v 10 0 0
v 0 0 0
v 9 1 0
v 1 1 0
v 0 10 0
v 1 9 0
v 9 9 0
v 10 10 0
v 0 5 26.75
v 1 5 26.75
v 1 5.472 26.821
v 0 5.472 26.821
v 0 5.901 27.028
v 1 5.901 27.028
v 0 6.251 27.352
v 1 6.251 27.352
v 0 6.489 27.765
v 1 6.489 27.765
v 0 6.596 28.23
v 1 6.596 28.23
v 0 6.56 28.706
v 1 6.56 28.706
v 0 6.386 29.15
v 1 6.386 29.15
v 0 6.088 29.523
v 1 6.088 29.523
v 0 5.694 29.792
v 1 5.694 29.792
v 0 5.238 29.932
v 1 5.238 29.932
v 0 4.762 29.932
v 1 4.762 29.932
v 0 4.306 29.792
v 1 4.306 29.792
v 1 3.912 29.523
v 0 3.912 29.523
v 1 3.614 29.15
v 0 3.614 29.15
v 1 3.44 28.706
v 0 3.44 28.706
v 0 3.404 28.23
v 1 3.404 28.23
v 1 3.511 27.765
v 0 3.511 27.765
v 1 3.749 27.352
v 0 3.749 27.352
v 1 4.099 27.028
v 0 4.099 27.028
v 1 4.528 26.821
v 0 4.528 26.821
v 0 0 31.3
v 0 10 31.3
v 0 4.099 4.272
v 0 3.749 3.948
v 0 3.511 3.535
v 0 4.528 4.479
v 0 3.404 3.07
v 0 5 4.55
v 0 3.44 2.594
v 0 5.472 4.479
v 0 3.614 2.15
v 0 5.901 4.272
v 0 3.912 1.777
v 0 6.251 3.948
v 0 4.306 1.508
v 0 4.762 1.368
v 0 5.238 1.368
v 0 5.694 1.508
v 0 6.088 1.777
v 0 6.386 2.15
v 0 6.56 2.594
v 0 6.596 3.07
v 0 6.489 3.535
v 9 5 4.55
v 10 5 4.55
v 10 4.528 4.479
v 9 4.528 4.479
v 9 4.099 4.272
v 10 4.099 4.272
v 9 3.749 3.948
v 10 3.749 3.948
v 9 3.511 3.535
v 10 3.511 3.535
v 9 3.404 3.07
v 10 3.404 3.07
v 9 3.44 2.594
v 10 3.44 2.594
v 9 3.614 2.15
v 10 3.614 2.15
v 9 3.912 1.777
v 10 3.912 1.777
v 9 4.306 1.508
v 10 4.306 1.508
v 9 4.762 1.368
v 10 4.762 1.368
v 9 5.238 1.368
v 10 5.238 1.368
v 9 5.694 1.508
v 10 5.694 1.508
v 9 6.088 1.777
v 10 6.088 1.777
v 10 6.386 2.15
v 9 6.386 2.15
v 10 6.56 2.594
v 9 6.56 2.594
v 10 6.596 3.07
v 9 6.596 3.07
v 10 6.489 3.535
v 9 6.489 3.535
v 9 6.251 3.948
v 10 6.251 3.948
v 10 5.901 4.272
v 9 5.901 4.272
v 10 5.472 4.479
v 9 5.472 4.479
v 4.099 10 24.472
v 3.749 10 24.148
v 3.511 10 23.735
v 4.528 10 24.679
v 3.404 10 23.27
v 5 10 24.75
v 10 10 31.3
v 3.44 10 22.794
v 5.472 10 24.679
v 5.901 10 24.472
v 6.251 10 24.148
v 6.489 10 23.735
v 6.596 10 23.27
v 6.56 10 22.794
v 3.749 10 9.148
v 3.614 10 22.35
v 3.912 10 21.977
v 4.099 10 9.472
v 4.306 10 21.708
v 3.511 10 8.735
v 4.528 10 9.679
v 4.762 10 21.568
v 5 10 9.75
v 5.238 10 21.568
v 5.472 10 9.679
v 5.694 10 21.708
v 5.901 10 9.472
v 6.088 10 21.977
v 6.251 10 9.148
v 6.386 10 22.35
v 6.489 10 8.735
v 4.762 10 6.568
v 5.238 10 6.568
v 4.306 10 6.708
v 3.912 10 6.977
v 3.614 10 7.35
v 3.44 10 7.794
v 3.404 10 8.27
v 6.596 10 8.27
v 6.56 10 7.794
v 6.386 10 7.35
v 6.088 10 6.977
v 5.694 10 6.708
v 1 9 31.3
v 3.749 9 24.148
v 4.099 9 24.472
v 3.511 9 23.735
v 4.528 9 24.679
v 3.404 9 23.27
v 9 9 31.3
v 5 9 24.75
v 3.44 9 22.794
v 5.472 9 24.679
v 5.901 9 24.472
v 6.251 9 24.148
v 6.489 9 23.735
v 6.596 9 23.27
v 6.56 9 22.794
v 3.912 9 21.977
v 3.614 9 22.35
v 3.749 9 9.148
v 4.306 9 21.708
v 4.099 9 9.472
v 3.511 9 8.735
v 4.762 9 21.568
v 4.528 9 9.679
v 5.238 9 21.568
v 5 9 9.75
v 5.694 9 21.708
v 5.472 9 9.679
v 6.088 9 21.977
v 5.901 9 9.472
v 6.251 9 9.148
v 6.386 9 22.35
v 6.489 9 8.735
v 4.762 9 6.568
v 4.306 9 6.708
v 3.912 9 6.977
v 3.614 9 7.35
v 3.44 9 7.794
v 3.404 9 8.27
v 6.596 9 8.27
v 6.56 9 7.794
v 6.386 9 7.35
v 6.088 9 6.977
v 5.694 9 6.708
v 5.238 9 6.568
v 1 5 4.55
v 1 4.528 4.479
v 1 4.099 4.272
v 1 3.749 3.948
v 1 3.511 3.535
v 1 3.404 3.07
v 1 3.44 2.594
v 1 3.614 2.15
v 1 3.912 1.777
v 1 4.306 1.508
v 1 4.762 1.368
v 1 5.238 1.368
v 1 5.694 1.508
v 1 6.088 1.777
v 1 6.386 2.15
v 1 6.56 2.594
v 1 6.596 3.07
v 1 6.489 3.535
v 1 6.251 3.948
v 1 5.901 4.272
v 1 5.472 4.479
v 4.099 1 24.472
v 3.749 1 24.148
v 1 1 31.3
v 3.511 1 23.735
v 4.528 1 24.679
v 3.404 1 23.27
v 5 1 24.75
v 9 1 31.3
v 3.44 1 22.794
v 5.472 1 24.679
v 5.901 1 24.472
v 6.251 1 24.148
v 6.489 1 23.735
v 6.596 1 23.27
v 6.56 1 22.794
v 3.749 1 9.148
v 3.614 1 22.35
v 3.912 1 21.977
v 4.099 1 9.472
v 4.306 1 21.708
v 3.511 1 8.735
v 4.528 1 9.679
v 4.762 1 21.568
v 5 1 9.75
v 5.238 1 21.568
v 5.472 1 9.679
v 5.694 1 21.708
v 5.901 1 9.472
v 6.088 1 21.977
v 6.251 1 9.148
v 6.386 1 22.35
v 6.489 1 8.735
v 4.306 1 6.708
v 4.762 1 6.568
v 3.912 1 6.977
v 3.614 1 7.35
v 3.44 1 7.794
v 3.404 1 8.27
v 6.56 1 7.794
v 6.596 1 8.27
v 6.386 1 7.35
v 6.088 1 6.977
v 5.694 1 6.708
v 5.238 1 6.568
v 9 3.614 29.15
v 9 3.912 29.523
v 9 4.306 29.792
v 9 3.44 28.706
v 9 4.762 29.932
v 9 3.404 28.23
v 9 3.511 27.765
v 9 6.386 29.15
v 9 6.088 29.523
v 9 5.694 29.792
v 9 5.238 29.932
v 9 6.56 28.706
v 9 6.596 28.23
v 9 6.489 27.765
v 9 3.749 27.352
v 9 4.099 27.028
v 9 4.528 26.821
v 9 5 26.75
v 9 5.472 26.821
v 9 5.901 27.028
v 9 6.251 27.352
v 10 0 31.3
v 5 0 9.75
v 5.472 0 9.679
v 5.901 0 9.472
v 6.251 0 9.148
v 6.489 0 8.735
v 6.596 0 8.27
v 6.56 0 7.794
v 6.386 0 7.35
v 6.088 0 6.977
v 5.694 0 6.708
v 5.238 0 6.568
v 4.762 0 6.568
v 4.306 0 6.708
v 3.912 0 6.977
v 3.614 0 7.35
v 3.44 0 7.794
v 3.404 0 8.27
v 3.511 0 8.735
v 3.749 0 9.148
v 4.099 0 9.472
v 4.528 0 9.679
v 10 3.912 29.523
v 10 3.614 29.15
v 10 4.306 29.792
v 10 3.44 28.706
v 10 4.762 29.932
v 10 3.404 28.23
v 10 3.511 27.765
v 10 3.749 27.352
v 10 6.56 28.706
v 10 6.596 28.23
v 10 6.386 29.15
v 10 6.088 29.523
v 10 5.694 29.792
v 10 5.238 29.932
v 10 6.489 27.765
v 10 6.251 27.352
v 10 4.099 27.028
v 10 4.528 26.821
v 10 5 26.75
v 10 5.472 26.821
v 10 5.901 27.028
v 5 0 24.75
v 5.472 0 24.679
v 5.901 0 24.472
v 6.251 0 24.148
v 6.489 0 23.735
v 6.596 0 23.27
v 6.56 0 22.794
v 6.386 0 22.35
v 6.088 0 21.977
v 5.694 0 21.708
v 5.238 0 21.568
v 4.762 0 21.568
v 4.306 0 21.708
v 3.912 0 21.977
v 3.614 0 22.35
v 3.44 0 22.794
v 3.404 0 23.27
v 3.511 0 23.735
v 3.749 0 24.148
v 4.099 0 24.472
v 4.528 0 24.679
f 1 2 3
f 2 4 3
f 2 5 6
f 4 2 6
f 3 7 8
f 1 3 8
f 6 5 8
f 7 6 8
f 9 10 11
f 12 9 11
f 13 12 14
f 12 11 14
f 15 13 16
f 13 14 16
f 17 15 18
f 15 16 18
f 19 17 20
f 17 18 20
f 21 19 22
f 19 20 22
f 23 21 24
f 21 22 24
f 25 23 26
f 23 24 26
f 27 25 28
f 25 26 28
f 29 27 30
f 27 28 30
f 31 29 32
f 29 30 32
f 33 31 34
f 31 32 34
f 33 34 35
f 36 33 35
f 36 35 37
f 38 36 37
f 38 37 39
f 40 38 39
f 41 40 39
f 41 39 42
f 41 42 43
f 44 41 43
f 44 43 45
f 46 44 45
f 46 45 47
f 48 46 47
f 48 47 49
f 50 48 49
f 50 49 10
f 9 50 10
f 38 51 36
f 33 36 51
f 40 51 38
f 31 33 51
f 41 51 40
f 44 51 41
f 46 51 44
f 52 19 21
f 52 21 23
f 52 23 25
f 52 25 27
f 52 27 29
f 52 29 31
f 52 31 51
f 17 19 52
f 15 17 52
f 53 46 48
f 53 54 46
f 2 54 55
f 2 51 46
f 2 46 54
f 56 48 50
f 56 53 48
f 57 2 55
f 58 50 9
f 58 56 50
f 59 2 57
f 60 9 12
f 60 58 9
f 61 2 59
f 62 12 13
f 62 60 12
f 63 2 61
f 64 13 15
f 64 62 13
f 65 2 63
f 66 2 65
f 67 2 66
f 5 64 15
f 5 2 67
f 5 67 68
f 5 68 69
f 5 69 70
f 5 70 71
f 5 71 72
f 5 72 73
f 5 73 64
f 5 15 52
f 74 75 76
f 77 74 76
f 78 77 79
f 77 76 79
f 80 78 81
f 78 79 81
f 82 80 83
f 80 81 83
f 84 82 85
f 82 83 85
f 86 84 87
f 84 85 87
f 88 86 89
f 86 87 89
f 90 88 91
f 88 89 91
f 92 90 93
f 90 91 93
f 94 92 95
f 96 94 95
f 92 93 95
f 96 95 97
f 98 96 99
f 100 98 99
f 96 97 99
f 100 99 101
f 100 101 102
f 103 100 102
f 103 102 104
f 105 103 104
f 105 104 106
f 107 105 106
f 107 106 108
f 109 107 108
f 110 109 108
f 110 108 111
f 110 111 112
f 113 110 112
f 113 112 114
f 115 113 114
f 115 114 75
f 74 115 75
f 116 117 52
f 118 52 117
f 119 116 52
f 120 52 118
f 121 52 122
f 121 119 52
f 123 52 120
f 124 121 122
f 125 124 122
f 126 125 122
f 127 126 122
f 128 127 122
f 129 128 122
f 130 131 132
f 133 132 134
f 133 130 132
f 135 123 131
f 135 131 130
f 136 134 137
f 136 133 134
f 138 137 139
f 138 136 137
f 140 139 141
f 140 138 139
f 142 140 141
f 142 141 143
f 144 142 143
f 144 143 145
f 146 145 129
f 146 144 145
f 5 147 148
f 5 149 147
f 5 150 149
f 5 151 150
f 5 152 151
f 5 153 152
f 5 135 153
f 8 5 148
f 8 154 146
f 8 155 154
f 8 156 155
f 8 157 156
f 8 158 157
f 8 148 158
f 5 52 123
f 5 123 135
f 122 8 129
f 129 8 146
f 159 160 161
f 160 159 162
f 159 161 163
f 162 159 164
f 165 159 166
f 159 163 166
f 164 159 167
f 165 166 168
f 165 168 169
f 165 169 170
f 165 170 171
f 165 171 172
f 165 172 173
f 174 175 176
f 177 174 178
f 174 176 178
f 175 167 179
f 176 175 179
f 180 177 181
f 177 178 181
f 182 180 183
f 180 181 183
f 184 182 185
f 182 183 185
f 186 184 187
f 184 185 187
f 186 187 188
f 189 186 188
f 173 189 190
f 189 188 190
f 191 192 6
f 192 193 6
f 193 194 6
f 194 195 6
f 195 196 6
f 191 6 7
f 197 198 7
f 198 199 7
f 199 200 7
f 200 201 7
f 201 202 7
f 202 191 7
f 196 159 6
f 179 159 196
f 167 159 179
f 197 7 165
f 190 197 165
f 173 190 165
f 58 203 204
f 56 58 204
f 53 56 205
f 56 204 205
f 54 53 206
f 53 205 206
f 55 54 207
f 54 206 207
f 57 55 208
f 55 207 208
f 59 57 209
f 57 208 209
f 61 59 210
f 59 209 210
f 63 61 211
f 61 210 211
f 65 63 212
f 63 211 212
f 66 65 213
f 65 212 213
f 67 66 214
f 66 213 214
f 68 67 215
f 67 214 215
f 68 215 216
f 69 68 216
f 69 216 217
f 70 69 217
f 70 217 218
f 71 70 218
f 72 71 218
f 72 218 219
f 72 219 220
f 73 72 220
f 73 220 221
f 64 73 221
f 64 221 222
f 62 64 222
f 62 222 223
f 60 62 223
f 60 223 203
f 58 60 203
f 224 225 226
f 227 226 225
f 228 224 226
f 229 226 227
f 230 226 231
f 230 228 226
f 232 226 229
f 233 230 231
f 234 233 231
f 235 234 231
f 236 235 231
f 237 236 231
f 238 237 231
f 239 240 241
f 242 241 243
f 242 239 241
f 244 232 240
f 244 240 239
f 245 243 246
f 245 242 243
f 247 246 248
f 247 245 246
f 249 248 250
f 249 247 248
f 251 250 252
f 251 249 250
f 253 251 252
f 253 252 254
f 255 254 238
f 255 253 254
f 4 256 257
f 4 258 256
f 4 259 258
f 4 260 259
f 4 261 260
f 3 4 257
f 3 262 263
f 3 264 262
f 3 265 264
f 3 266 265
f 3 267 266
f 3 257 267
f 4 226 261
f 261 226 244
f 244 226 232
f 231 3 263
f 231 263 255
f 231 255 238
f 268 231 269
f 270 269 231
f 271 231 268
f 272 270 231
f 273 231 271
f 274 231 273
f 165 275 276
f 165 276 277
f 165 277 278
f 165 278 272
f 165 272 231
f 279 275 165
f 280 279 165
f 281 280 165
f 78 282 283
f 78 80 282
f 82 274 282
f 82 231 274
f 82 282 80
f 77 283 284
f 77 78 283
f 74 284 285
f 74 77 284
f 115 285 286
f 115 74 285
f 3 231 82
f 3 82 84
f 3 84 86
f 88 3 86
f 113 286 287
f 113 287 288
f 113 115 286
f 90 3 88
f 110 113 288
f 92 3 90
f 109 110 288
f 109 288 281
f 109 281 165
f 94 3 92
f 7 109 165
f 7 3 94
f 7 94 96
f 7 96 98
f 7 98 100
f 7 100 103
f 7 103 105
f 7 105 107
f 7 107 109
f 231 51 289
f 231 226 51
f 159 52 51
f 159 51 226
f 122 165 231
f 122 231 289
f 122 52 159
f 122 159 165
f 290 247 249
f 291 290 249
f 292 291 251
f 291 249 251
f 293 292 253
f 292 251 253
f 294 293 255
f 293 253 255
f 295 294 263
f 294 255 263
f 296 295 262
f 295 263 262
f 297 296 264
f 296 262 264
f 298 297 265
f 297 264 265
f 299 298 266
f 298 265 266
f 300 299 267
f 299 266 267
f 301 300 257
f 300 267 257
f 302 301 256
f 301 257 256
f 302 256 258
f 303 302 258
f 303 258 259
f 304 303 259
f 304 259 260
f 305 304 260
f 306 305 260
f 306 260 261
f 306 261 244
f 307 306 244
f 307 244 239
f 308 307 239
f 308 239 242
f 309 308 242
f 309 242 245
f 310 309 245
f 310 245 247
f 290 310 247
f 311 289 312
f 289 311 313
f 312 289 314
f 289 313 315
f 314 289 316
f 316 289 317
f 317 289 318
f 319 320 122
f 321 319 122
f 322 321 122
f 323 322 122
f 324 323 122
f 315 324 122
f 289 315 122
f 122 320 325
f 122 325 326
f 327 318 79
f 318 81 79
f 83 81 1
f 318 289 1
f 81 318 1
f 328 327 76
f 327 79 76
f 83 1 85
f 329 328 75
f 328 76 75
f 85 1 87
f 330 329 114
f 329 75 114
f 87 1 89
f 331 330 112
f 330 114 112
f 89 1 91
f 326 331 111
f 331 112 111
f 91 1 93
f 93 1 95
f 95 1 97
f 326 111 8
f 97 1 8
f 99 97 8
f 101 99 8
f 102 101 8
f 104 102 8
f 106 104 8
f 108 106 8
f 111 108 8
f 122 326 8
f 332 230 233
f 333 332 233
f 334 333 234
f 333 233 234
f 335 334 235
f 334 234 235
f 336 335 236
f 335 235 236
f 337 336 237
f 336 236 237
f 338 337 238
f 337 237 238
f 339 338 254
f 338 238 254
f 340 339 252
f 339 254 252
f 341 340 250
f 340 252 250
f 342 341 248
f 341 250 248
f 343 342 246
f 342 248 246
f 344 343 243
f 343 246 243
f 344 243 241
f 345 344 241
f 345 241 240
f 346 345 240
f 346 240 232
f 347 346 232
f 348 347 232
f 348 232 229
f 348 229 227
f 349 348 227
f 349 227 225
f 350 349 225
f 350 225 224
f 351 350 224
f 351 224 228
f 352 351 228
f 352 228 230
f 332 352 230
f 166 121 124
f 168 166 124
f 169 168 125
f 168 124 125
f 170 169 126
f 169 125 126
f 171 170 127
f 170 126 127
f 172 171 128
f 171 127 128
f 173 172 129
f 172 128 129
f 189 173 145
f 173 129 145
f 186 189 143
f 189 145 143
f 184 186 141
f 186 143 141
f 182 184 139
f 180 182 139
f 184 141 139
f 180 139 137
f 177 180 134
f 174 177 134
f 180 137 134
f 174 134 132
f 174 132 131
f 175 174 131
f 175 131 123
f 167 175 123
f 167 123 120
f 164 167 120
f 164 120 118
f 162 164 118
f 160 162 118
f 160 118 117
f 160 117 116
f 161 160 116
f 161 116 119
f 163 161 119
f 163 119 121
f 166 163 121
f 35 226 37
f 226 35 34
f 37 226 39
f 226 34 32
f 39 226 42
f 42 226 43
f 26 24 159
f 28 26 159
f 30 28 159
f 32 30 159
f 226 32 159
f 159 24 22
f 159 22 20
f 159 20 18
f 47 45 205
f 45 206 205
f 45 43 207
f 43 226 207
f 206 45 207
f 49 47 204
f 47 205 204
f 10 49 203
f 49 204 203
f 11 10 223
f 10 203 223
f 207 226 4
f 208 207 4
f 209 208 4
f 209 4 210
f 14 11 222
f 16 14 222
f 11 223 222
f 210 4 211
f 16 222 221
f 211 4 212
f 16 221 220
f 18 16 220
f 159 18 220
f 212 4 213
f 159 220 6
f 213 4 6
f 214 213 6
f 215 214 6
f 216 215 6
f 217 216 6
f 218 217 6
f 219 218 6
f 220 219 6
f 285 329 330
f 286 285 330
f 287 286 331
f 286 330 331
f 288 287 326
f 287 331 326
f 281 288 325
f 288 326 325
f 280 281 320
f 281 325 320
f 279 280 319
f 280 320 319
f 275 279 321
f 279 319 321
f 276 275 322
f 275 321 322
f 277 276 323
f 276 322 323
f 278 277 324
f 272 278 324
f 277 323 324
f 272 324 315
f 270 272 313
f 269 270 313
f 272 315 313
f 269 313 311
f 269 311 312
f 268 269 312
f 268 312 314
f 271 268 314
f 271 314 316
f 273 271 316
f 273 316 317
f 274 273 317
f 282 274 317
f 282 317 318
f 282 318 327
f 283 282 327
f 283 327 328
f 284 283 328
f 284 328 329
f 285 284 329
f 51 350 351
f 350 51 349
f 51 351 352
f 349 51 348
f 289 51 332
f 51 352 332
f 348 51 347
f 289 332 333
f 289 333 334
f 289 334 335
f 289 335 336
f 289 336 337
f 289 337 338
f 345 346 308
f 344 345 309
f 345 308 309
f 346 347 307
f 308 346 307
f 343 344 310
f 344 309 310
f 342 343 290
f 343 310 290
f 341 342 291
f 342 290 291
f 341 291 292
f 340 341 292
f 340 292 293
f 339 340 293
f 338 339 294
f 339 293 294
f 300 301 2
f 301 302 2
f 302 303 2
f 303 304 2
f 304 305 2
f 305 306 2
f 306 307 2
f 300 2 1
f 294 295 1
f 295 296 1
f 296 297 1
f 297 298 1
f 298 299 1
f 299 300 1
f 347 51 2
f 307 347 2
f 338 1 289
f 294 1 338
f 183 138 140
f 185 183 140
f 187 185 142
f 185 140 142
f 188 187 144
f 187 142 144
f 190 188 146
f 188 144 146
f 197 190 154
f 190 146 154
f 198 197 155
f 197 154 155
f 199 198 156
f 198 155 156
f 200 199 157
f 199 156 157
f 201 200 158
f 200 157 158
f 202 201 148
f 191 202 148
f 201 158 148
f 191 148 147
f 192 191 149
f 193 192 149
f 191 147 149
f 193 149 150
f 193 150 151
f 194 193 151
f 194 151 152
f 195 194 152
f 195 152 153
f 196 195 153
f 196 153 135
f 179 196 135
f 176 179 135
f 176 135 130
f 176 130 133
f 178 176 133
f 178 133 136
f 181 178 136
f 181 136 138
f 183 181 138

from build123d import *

# Parameters (mm, degrees)
SKETCH_2_W          = 10
SKETCH_2_H          = 10
SKETCH_2_W_2        = 8
SKETCH_2_H_2        = 8
EXTRUDE_1_DEPTH     = 31.3
CUT_EXTRUDE_1_REACH = 36.347
SKETCH_3_R          = 1.6
CUT_EXTRUDE_2_REACH = 36.347
SKETCH_4_R          = 1.6


with BuildPart() as part:
    # ｽｹｯﾁ2 → 押し出し-薄板1 (new body)
    with BuildSketch(Plane.XY):
        with Locations((5, 5)):
            Rectangle(SKETCH_2_W, SKETCH_2_H)
        with Locations((5, 5)):
            Rectangle(SKETCH_2_W_2, SKETCH_2_H_2, mode=Mode.SUBTRACT)
    extrude(amount=EXTRUDE_1_DEPTH)

    # ｶｯﾄ - 押し出し1: up to this face of the body (flat: up to its plane)
    cut_extrude_1_end = Plane(part.part.faces().sort_by_distance((5, 0, 15.65))[0])
    # ｽｹｯﾁ3 → ｶｯﾄ - 押し出し1 (cut, up to the picked face)
    with BuildSketch(Plane(origin=(0, 10, 0), x_dir=(1, 0, 0), z_dir=(0, 1, 0)), mode=Mode.PRIVATE) as cut_extrude_1_sk1:
        with Locations(Location((5, -23.15, 0), (0, 0, 270))):
            Circle(SKETCH_3_R)
    cut_extrude_1_tool1 = split(extrude(cut_extrude_1_sk1.sketch, amount=-CUT_EXTRUDE_1_REACH, mode=Mode.PRIVATE), bisect_by=cut_extrude_1_end, keep=Keep.BOTH, mode=Mode.PRIVATE)
    # ｽｹｯﾁ3 → ｶｯﾄ - 押し出し1 (cut, up to the picked face)
    with BuildSketch(Plane(origin=(0, 10, 0), x_dir=(1, 0, 0), z_dir=(0, 1, 0)), mode=Mode.PRIVATE) as cut_extrude_1_sk2:
        with Locations(Location((5, -8.15, 0), (0, 0, 270))):
            Circle(SKETCH_3_R)
    cut_extrude_1_tool2 = split(extrude(cut_extrude_1_sk2.sketch, amount=-CUT_EXTRUDE_1_REACH, mode=Mode.PRIVATE), bisect_by=cut_extrude_1_end, keep=Keep.BOTH, mode=Mode.PRIVATE)
    add(cut_extrude_1_tool1.solids().sort_by(Axis((5, 10, 23.15), (0, -1, 0)))[0], mode=Mode.SUBTRACT)
    add(cut_extrude_1_tool2.solids().sort_by(Axis((5, 10, 8.15), (0, -1, 0)))[0], mode=Mode.SUBTRACT)

    # ｶｯﾄ - 押し出し2: up to this face of the body (flat: up to its plane)
    cut_extrude_2_end = Plane(part.part.faces().sort_by_distance((0, 5, 15.65))[0])
    # ｽｹｯﾁ4 → ｶｯﾄ - 押し出し2 (cut, up to the picked face)
    with BuildSketch(Plane(origin=(10, 0, 0), x_dir=(0, 0, -1), z_dir=(1, 0, 0)), mode=Mode.PRIVATE) as cut_extrude_2_sk1:
        with Locations((-28.35, 5)):
            Circle(SKETCH_4_R)
    cut_extrude_2_tool1 = split(extrude(cut_extrude_2_sk1.sketch, amount=-CUT_EXTRUDE_2_REACH, mode=Mode.PRIVATE), bisect_by=cut_extrude_2_end, keep=Keep.BOTH, mode=Mode.PRIVATE)
    # ｽｹｯﾁ4 → ｶｯﾄ - 押し出し2 (cut, up to the picked face)
    with BuildSketch(Plane(origin=(10, 0, 0), x_dir=(0, 0, -1), z_dir=(1, 0, 0)), mode=Mode.PRIVATE) as cut_extrude_2_sk2:
        with Locations(Location((-2.95, 5, 0), (0, 0, 180))):
            Circle(SKETCH_4_R)
    cut_extrude_2_tool2 = split(extrude(cut_extrude_2_sk2.sketch, amount=-CUT_EXTRUDE_2_REACH, mode=Mode.PRIVATE), bisect_by=cut_extrude_2_end, keep=Keep.BOTH, mode=Mode.PRIVATE)
    add(cut_extrude_2_tool1.solids().sort_by(Axis((10, 5, 28.35), (-1, 0, 0)))[0], mode=Mode.SUBTRACT)
    add(cut_extrude_2_tool2.solids().sort_by(Axis((10, 5, 2.95), (-1, 0, 0)))[0], mode=Mode.SUBTRACT)


solid = part.part
